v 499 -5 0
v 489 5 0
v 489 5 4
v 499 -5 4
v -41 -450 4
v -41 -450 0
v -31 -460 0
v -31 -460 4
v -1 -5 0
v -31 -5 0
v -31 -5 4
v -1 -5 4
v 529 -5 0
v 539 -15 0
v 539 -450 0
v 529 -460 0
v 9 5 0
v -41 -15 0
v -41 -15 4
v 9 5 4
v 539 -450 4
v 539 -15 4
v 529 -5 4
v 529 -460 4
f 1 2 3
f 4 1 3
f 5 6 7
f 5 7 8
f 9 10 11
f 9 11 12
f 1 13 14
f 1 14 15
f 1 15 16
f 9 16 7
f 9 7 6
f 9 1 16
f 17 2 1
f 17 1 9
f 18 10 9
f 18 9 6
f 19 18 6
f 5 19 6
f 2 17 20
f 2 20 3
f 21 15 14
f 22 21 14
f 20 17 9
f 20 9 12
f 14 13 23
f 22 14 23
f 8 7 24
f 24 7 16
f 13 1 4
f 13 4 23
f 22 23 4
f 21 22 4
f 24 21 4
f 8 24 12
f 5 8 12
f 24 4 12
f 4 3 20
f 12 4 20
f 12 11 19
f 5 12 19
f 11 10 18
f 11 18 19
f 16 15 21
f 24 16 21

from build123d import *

# Parameters (mm, degrees)
BOSS_EXTRUDE1_DEPTH = 4
CHAMFER1_SIZE       = 10
CHAMFER2_SIZE       = 10


with BuildPart() as part:
    # Sketch1 → Boss-Extrude1 (new body)
    with BuildSketch(Plane.XY):
        Polygon((-41, -5), (-1, -5), (-1, 5), (499, 5), (499, -5), (539, -5), (539, -420), (539, -460), (497, -460), (1, -460), (-41, -460), (-41, -420), align=None)
    extrude(amount=BOSS_EXTRUDE1_DEPTH)

    # Chamfer1
    chamfer1_edges = [part.edges().sort_by_distance(p)[0] for p in [
        (499, 5, 2),
        (-1, 5, 2),
    ]]
    chamfer(chamfer1_edges, length=CHAMFER1_SIZE - 0.0001)  # a hair under: the kernel refuses the full size

    # Chamfer2
    chamfer2_edges = [part.edges().sort_by_distance(p)[0] for p in [
        (539, -5, 2),
        (539, -460, 2),
        (-41, -460, 2),
        (-41, -5, 2),
    ]]
    chamfer(chamfer2_edges, length=CHAMFER2_SIZE)


solid = part.part
